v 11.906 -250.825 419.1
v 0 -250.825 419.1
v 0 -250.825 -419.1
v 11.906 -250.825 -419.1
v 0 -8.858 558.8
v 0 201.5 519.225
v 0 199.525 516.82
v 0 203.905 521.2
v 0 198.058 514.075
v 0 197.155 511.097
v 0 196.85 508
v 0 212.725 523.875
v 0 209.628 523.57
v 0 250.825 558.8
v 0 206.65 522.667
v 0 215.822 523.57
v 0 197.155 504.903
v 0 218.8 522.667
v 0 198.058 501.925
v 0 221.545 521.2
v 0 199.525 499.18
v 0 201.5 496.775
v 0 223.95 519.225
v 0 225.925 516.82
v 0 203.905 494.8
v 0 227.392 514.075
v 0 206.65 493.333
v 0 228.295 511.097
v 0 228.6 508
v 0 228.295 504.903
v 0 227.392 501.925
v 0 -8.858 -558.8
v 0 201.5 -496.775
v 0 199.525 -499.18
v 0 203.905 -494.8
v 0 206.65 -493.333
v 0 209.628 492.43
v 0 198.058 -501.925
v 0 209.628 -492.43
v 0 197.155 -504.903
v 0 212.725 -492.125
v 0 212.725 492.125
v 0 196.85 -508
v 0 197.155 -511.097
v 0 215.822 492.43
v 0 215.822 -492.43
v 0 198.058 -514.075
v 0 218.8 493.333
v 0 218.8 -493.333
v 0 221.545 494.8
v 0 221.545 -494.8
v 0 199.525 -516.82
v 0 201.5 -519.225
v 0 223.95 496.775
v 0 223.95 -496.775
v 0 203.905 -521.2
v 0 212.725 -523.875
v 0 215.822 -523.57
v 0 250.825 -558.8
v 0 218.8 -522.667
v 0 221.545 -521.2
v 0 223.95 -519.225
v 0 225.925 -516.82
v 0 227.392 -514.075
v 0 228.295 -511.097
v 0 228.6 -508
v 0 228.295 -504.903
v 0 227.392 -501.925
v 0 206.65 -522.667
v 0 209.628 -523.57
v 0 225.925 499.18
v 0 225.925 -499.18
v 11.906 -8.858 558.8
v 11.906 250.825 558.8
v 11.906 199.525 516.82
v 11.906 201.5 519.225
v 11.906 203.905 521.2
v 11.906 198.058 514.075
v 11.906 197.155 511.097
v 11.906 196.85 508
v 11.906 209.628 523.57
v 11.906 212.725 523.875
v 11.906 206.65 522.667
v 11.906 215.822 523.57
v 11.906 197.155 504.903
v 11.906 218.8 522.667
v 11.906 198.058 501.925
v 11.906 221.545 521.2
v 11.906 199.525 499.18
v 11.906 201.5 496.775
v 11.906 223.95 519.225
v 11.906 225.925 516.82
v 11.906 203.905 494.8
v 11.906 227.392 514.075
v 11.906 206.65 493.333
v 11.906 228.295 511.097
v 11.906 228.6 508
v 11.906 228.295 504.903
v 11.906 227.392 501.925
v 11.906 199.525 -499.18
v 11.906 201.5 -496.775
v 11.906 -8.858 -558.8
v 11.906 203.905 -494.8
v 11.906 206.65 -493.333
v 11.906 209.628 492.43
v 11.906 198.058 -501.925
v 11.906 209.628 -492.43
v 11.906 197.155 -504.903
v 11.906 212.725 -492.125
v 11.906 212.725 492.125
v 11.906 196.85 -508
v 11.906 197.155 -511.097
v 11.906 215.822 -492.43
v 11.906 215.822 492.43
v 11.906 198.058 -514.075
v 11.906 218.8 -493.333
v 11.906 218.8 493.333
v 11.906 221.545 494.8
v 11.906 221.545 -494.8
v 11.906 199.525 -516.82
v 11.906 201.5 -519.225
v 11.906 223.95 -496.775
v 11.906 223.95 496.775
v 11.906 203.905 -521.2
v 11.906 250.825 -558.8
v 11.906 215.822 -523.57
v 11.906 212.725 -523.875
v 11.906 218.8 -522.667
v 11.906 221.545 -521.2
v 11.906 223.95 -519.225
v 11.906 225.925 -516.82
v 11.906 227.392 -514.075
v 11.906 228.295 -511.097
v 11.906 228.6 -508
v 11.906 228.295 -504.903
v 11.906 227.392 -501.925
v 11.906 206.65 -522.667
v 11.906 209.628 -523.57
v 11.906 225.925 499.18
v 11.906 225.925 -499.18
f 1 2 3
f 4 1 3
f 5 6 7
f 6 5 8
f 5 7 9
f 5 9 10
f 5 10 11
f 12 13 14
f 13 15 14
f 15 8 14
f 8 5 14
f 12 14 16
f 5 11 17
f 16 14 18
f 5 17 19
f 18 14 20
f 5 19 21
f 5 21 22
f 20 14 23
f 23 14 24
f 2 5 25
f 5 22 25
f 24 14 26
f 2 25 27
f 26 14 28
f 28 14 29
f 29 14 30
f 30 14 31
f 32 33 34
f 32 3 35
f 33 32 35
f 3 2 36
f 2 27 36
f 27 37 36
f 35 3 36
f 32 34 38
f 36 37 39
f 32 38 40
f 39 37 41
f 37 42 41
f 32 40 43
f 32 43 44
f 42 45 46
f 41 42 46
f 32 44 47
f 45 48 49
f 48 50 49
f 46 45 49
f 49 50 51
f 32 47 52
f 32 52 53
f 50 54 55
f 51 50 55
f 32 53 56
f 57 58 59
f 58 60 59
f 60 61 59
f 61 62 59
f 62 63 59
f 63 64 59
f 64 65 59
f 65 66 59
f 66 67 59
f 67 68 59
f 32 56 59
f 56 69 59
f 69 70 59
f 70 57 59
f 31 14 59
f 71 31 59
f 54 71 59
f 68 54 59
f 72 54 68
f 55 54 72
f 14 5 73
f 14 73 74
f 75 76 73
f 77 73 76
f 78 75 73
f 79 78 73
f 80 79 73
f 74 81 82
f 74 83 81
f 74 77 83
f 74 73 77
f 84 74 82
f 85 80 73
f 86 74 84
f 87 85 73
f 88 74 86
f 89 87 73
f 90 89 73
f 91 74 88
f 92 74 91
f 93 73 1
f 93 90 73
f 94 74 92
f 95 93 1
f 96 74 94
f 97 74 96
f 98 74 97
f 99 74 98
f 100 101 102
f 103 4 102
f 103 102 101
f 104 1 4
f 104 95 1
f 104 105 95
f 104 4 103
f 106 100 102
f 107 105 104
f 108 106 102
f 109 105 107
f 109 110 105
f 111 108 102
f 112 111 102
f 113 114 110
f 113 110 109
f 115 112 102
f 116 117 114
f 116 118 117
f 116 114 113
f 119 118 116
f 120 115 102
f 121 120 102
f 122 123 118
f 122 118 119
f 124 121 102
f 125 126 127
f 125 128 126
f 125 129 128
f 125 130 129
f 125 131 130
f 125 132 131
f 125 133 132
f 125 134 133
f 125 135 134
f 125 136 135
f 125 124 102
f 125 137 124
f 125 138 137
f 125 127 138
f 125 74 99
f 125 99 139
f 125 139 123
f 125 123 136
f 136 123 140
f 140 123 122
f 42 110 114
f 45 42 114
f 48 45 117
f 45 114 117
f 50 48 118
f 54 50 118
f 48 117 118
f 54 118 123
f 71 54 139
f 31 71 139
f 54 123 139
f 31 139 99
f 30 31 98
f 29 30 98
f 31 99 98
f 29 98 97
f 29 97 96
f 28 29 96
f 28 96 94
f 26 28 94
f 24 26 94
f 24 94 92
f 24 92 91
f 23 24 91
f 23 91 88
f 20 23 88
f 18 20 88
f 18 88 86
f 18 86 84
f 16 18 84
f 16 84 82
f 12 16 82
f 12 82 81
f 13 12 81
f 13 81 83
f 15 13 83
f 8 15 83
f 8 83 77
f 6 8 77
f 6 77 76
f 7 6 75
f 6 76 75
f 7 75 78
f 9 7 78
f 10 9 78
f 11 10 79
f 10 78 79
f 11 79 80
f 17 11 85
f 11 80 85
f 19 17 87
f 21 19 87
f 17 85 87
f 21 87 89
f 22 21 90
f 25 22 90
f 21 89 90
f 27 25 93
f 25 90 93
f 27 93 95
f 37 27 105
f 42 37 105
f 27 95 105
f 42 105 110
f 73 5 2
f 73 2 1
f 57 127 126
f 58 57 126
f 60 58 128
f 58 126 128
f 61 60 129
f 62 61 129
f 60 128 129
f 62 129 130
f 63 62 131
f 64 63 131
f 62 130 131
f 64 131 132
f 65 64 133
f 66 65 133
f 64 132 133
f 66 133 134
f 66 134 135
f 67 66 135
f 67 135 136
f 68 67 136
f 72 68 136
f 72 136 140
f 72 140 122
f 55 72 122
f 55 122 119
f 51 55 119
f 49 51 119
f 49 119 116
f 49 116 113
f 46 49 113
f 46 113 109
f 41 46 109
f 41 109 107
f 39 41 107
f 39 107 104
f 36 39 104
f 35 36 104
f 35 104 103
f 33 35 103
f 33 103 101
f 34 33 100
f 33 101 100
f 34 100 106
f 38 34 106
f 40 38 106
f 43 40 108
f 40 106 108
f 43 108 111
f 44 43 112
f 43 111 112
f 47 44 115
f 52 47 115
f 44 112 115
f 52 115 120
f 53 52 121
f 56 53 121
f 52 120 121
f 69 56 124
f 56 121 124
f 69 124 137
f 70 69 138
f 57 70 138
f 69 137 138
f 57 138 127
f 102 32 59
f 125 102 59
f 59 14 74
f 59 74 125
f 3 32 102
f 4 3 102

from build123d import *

# Parameters (mm, degrees)
SKETCH1_W           = 1117.6
SKETCH1_H           = 501.65
BOSS_EXTRUDE1_DEPTH = 11.90625
SKETCH3_R           = 15.875
CUT_EXTRUDE1_DEPTH  = 613.627439325
CHAMFER1_SIZE       = 139.7
CHAMFER1_SIZE2      = 241.967497817


with BuildPart() as part:
    # Sketch1 → Boss-Extrude1 (new body)
    with BuildSketch(Plane(origin=(0, 0, 0), x_dir=(0, 0, -1), z_dir=(1, 0, 0))):
        Rectangle(SKETCH1_W, SKETCH1_H)
    extrude(amount=BOSS_EXTRUDE1_DEPTH)

    # Sketch3 → Cut-Extrude1 (cut, through all)
    with BuildSketch(Plane(origin=(11.90625, 0, 0), x_dir=(0, 0, -1), z_dir=(1, 0, 0))):
        with Locations((-508, 212.725)):
            Circle(SKETCH3_R)
        with Locations((508, 212.725)):
            Circle(SKETCH3_R)
    extrude(amount=-CUT_EXTRUDE1_DEPTH, mode=Mode.SUBTRACT)

    # Chamfer1
    chamfer1_edges = [part.edges().sort_by_distance(p)[0] for p in [
        (5.953125, -250.825, -558.8),
        (5.953125, -250.825, 558.8),
    ]]
    chamfer1_side = [part.faces().sort_by_distance(p)[0] for p in [
        (5.953125, -250.825, 0),
    ]]
    chamfer(chamfer1_edges, length=CHAMFER1_SIZE, length2=CHAMFER1_SIZE2, reference=chamfer1_side[0])


solid = part.part
